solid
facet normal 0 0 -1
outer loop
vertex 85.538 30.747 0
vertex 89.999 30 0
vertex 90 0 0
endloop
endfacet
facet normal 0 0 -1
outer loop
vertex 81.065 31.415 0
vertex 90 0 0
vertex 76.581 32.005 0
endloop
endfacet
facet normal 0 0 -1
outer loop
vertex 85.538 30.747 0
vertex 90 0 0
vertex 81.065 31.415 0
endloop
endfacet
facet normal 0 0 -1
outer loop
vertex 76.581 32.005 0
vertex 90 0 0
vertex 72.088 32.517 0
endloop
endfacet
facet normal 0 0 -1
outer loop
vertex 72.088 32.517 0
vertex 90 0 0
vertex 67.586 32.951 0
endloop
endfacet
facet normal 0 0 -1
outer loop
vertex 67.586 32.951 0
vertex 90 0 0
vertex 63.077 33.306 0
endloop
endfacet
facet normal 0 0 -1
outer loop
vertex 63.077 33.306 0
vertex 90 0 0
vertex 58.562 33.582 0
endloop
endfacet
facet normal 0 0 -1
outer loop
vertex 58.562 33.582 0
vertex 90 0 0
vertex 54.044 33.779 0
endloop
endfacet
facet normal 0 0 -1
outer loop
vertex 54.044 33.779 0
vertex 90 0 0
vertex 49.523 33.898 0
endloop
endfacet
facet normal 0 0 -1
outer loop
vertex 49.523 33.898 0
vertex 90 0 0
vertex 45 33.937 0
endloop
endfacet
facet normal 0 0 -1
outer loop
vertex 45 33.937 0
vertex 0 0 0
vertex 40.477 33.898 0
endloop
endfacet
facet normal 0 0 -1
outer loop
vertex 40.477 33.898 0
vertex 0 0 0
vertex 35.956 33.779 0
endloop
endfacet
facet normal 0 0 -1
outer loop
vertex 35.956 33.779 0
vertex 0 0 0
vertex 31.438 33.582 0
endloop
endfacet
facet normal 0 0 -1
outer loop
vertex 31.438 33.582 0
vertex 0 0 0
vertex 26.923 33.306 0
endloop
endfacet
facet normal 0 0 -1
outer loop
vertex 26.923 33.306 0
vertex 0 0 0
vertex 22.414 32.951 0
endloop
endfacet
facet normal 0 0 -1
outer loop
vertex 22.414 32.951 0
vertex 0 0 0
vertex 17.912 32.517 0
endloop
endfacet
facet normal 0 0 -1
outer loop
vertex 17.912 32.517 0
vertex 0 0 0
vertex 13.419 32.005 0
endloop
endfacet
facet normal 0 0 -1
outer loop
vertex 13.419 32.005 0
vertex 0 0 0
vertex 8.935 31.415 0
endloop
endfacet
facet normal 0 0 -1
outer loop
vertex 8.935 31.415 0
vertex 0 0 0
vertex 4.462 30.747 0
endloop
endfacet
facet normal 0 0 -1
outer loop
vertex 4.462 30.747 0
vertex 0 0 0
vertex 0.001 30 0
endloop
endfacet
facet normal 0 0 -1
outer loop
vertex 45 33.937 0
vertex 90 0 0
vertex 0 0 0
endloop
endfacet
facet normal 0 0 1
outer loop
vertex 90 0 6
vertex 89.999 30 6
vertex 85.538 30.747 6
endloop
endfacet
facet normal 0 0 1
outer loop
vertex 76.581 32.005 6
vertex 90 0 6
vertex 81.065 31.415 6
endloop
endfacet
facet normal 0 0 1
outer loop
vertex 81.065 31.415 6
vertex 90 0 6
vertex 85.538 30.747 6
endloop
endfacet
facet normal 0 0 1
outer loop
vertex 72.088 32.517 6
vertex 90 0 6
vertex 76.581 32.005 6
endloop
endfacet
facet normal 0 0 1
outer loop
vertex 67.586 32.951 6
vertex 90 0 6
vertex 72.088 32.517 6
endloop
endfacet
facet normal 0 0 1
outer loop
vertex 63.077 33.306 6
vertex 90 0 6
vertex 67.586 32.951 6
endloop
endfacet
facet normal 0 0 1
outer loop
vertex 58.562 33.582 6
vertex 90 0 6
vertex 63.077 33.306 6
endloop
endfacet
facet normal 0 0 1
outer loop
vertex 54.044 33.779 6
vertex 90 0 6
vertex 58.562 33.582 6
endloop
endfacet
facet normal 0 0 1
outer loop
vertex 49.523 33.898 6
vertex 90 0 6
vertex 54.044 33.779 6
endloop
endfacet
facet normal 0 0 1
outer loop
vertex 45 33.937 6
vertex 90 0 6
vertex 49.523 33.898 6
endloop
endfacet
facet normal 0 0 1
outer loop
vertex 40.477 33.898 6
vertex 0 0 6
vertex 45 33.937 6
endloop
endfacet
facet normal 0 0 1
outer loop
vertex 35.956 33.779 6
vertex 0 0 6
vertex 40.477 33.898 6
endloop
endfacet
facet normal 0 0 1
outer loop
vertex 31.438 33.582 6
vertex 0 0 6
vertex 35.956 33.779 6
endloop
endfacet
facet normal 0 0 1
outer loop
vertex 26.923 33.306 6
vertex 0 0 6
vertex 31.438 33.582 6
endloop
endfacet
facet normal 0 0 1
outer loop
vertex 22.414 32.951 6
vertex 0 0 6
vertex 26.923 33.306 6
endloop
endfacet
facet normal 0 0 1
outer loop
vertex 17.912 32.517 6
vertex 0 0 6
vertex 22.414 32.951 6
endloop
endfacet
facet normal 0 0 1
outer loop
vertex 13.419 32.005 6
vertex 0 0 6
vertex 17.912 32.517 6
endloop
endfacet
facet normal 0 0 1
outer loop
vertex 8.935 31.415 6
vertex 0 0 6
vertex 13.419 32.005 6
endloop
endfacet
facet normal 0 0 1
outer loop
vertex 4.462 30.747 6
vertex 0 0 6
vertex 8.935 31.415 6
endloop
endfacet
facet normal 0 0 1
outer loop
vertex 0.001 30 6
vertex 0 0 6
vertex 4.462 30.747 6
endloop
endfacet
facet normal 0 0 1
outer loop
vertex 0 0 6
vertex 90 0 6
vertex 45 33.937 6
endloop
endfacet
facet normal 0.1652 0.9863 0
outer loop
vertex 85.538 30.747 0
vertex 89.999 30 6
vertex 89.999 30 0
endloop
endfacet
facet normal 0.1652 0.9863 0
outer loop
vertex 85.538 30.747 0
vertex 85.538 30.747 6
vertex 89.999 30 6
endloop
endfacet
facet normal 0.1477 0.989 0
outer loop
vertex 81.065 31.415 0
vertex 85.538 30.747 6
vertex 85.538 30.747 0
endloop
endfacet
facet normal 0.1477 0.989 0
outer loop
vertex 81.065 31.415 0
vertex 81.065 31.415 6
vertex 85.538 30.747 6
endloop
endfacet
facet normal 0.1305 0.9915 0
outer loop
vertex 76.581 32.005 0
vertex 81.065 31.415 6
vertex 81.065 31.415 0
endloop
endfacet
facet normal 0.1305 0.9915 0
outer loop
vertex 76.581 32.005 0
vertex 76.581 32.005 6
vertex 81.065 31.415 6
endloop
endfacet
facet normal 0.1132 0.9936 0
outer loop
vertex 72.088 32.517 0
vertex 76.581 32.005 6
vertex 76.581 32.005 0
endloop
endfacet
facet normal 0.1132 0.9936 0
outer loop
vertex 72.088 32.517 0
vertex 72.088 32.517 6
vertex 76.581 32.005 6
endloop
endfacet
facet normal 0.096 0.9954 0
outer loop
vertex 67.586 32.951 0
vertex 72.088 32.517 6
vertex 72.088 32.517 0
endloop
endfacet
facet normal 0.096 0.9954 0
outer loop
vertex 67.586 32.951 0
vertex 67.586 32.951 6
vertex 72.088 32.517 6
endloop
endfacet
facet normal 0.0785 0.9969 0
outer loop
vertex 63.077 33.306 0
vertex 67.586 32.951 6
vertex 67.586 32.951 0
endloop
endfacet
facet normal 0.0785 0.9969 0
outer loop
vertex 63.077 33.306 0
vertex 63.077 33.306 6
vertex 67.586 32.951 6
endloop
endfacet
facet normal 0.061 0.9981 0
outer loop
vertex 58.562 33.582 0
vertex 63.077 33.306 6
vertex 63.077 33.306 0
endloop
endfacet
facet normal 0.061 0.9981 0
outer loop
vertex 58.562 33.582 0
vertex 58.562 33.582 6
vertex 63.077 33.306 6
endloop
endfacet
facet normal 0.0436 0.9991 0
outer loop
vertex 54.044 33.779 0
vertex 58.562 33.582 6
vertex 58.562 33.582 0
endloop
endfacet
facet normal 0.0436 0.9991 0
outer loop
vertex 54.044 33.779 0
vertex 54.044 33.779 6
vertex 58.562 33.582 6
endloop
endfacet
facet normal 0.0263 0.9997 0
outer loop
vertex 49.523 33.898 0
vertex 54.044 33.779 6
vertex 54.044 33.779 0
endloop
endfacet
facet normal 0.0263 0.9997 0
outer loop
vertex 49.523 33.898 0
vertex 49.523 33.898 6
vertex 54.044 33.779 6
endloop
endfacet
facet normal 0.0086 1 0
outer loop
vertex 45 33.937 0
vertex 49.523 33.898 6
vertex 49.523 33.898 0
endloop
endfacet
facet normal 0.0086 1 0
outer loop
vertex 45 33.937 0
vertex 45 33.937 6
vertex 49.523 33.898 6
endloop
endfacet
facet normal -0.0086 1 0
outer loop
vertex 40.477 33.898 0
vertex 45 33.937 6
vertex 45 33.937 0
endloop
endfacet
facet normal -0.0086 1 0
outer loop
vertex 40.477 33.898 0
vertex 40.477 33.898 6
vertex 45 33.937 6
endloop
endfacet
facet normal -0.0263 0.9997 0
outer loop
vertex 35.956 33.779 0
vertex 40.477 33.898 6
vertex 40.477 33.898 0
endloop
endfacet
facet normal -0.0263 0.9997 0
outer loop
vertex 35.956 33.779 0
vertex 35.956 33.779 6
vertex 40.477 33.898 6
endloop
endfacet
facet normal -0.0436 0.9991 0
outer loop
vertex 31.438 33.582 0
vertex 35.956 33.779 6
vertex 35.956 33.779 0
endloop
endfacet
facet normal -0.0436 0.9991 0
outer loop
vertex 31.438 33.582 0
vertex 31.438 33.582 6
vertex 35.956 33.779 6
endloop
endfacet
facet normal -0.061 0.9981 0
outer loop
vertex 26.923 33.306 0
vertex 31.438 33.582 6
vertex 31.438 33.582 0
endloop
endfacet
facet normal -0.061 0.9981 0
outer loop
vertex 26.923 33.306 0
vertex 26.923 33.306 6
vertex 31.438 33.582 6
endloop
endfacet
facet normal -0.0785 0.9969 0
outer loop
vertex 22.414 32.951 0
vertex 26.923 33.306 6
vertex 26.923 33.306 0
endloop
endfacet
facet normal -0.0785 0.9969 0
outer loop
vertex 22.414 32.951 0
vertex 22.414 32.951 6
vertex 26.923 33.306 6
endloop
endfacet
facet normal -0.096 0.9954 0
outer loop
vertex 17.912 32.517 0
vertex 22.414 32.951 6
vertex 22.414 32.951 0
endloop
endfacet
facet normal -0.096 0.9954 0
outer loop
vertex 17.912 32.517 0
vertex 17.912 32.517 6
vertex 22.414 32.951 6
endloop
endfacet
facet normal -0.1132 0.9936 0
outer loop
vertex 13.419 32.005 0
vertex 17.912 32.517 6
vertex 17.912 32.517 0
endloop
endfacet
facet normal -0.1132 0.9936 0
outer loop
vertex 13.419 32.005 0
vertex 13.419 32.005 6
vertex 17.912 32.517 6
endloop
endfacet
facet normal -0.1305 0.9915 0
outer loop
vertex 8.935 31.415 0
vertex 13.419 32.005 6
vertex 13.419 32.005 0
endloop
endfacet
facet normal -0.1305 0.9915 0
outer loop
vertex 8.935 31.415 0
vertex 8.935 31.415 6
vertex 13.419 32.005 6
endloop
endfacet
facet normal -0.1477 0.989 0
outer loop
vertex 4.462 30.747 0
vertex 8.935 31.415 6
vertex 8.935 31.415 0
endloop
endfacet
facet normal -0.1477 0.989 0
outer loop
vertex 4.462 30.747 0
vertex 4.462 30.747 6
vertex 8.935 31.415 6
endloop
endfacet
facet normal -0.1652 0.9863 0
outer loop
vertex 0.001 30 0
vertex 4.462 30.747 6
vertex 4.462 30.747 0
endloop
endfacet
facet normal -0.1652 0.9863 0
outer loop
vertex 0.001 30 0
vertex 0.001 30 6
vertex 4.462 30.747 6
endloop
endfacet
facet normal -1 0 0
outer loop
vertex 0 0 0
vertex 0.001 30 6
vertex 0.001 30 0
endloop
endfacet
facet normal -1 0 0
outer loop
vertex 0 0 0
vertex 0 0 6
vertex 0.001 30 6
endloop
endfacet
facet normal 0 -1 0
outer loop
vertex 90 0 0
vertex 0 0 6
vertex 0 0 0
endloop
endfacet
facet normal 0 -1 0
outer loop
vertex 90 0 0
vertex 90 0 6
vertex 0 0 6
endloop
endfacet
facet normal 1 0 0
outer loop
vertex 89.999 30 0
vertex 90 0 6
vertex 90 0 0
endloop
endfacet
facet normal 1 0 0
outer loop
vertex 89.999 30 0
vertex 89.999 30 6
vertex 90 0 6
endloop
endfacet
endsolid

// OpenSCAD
$fn = 32;

// ----------------------------------------------------------------------
// Arc profile plate: crown, 23 points
// ----------------------------------------------------------------------

// --- parameters (mm) ---
bar_l = 90;               // bar length, X
bar_w = 30;               // bar height at the ends, Y
arc_r = 259.14;           // radius of the crown arc
arc_angle = 20;           // crown arc angle, degrees
crown_rise = 3.94;        // rise of the crown over the ends
arc_step = 1;             // sampling step of the crown arc, degrees
plate_t = 6;              // plate thickness, Z

bbox_y = bar_w + crown_rise;  // full height with the crown

profile = [[89.999, 30], [85.538, 30.747], [81.065, 31.415], [76.581, 32.005], [72.088, 32.517], [67.586, 32.951], [63.077, 33.306], [58.562, 33.582], [54.044, 33.779], [49.523, 33.898], [45, 33.937], [40.477, 33.898], [35.956, 33.779], [31.438, 33.582], [26.923, 33.306], [22.414, 32.951], [17.912, 32.517], [13.419, 32.005], [8.935, 31.415], [4.462, 30.747], [0.001, 30], [0, 0], [90, 0]];  // primary outline, 23 points, counter clockwise

// --- the one profile operation ---
linear_extrude(height = plate_t) polygon(points = profile);
